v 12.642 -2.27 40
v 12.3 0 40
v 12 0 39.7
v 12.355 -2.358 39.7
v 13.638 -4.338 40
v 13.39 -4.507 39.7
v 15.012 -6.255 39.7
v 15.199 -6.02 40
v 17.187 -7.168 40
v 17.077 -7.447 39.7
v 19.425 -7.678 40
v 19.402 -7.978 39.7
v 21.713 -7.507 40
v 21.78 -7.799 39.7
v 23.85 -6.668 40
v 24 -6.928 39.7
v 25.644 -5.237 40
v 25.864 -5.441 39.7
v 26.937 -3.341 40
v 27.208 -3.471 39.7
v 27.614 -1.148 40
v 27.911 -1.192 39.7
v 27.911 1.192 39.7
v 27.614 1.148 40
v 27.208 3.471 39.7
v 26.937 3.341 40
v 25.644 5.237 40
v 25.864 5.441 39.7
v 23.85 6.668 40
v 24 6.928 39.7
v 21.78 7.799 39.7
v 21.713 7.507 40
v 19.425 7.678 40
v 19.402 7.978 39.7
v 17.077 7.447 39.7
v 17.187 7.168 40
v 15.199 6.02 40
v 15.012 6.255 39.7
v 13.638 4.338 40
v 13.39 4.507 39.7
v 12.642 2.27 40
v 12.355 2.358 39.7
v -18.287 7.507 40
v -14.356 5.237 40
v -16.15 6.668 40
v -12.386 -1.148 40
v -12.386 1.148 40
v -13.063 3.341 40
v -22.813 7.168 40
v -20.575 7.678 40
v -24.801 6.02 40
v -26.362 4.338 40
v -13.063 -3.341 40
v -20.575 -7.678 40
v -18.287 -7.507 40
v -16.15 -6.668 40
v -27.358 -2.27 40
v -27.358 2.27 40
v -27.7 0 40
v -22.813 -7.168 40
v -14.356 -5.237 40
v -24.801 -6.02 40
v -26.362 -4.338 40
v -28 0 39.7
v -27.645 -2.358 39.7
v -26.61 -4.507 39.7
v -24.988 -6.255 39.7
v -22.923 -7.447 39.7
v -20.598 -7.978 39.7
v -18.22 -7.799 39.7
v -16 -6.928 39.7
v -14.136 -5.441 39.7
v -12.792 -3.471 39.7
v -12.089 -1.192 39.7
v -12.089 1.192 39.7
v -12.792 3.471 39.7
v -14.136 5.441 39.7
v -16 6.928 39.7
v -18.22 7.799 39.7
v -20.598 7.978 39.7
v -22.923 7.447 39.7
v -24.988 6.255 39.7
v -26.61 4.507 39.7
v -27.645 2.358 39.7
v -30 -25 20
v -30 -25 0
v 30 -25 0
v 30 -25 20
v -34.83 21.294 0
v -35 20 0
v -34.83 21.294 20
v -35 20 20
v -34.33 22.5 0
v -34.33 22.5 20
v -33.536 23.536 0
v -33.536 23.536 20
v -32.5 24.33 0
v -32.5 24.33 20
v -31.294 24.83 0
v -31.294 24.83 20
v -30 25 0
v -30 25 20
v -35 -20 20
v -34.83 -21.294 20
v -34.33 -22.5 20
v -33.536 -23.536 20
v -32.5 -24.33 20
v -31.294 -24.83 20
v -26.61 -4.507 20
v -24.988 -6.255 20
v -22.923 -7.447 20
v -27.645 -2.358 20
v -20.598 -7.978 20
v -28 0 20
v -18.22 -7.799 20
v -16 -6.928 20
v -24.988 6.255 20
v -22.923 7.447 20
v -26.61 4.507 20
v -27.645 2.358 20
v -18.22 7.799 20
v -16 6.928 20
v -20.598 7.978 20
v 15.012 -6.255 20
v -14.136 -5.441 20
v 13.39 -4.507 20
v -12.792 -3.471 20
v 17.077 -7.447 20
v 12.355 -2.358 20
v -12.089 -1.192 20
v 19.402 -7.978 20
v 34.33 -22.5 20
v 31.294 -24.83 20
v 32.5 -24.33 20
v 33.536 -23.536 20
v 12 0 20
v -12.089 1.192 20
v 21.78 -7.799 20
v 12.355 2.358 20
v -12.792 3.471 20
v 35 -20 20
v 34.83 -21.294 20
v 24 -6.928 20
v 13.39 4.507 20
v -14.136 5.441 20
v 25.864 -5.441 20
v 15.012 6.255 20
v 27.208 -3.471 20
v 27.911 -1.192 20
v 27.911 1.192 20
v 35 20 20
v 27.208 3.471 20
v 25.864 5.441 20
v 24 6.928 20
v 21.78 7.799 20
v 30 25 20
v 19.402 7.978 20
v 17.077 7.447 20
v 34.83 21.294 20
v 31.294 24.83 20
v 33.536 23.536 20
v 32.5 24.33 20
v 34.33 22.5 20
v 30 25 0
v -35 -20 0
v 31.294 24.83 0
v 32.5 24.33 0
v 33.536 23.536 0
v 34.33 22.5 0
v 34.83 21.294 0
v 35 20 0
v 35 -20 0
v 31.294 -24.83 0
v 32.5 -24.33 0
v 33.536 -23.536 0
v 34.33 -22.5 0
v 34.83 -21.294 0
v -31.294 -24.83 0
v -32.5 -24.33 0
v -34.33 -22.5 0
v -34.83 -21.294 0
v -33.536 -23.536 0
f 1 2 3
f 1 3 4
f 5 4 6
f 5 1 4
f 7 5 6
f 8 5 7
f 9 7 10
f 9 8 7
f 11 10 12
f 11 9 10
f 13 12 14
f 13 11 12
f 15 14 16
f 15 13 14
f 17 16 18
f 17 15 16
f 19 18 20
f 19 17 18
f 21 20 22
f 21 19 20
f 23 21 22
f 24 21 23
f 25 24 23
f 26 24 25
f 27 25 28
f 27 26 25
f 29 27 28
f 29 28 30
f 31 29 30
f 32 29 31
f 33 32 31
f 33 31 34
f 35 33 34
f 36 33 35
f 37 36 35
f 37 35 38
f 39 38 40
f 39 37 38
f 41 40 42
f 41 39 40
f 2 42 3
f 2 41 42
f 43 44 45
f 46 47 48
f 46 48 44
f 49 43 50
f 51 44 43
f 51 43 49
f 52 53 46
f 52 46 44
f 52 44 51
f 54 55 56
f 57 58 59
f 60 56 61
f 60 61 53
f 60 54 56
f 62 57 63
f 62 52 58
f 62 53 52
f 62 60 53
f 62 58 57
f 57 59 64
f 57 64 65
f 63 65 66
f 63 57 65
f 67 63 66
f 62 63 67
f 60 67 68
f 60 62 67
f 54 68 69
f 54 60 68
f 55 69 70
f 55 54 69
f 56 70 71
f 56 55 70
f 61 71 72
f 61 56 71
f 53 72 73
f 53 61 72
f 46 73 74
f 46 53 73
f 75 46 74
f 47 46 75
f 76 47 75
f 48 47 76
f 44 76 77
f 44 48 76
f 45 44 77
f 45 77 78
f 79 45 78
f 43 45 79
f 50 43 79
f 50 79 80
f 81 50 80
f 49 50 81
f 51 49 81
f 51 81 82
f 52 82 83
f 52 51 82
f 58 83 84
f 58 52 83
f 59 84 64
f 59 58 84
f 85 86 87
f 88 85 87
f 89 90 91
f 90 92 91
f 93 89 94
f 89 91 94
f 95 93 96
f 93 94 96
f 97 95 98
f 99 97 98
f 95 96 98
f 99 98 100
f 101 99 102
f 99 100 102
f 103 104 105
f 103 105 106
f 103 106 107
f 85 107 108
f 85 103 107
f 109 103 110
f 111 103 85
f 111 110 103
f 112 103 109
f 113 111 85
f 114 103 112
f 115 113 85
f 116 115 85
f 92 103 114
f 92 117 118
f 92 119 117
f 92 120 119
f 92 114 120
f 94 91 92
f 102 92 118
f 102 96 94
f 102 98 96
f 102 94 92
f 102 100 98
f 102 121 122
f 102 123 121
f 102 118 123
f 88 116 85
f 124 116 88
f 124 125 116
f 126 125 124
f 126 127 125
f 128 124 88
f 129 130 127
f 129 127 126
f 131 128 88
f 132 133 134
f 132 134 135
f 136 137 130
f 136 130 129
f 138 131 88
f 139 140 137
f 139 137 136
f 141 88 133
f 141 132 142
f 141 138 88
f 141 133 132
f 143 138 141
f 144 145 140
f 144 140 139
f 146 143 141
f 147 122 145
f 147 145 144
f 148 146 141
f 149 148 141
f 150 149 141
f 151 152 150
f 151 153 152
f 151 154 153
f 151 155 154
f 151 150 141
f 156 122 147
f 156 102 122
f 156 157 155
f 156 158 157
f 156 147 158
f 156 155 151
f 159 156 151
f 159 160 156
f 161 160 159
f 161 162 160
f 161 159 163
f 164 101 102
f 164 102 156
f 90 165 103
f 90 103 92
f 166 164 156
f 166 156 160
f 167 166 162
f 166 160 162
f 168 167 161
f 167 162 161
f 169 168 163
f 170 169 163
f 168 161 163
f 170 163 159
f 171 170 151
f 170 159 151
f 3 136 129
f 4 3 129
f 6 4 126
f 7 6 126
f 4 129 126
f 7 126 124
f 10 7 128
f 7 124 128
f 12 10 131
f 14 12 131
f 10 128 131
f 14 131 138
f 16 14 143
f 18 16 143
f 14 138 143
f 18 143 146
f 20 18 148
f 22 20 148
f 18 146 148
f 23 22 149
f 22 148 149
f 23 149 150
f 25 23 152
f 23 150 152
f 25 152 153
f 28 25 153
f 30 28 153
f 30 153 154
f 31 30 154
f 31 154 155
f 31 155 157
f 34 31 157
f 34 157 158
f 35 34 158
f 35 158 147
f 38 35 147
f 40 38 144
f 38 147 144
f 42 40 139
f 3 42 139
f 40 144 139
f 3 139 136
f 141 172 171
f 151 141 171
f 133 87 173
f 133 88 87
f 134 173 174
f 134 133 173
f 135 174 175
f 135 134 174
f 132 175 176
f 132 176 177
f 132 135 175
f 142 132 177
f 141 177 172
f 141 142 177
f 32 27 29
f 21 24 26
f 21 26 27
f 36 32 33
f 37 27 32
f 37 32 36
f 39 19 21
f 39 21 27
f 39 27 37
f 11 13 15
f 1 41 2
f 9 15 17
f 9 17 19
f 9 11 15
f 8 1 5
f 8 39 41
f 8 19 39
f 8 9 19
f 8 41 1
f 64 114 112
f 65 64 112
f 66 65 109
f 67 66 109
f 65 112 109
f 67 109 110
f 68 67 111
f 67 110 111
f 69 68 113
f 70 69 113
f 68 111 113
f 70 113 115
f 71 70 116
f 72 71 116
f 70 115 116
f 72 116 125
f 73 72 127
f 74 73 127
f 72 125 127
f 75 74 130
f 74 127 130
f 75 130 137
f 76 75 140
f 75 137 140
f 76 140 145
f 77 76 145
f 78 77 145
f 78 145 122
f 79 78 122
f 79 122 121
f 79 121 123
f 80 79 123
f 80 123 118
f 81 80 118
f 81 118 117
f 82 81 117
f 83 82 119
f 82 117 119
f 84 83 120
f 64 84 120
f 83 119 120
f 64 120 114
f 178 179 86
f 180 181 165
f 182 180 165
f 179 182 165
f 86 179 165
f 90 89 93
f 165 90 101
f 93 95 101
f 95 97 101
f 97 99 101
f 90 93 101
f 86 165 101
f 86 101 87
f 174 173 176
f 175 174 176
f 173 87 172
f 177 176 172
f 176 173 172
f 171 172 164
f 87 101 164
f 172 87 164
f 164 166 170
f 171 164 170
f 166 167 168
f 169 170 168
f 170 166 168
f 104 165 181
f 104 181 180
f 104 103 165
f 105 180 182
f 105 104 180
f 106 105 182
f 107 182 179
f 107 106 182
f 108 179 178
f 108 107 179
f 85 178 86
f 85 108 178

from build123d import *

# Parameters (mm, degrees)
SKETCH_1_W      = 70
SKETCH_1_H      = 50
EXTRUDE_1_DEPTH = 20
SKETCH_2_R      = 8
EXTRUDE_2_DEPTH = 20
CHAMFER_1_SIZE  = 0.3
FILLET_1_R      = 5


with BuildPart() as part:
    # Эскиз1 → Бобышка-Вытянуть1 (new body)
    with BuildSketch(Plane.XY):
        Rectangle(SKETCH_1_W, SKETCH_1_H)
    extrude(amount=EXTRUDE_1_DEPTH)

    # Эскиз2 → Бобышка-Вытянуть2 (add)
    with BuildSketch(Plane.XY.offset(20)):
        with Locations((-20, 0)):
            Circle(SKETCH_2_R)
        with Locations((20, 0)):
            Circle(SKETCH_2_R)
    extrude(amount=EXTRUDE_2_DEPTH)

    # Фаска1
    chamfer_1_edges = [part.edges().sort_by_distance(p)[0] for p in [
        (12, 0, 40),
        (-28, 0, 40),
    ]]
    chamfer(chamfer_1_edges, length=CHAMFER_1_SIZE)

    # Скругление1
    fillet_1_edges = [part.edges().sort_by_distance(p)[0] for p in [
        (-35, -25, 10),
        (35, -25, 10),
        (35, 25, 10),
        (-35, 25, 10),
    ]]
    fillet(fillet_1_edges, radius=FILLET_1_R)


solid = part.part
